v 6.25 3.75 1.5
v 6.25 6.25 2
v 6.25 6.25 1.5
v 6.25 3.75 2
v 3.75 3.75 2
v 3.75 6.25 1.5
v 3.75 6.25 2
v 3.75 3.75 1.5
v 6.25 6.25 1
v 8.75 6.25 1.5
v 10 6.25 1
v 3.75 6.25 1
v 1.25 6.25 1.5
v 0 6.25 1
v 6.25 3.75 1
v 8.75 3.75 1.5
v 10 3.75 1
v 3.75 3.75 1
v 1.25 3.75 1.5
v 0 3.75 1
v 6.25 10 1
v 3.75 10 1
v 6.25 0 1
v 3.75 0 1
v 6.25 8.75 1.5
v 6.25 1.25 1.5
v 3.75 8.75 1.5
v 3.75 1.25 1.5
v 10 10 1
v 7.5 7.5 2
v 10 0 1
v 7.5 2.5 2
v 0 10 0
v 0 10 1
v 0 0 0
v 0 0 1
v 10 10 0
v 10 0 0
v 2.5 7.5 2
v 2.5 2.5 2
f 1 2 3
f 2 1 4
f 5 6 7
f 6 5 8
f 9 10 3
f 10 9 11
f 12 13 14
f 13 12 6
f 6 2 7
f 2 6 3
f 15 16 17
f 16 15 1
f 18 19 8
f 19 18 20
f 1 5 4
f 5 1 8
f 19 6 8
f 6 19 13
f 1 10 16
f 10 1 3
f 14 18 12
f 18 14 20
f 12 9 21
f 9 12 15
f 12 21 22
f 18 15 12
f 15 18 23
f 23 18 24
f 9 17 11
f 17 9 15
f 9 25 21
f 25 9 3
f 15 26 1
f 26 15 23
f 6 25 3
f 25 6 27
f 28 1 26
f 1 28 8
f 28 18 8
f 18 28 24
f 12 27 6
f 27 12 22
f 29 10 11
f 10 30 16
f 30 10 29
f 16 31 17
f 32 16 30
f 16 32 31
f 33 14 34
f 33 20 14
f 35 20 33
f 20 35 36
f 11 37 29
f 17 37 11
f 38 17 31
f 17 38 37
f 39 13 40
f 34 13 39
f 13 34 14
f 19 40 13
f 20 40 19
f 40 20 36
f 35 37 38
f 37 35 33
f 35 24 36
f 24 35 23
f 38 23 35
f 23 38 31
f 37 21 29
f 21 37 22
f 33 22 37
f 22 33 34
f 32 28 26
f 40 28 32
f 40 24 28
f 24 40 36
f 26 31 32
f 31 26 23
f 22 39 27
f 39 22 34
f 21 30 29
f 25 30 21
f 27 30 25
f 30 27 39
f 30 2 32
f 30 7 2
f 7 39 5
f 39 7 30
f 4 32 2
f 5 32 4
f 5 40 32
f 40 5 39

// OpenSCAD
///< Zip tie pad

pad_w = 10;
pad_d = pad_w;
pad_h = 1;

zip_tie_pad();

module zip_tie_pad(){
     center = pad_w/2-pad_w/8;
     difference(){
	  tie_pad(pad_w, pad_h);
	  zip_anchor(pad_w, pad_h, center);
     }
}

module zip_anchor(w,h,c){    
     color( rand_clr() )
	  union(){
	  translate([c,c,h+h*0.1])color( rand_clr() )cube( [w/4, w/4, h] );
	  translate([0,c,h])cube([w, w/4, h/2]);
	  translate([c,0,h])cube([w/4, w, h/2]);
     }
}

module tie_pad(w,h){
    hull(){
        cube([w, w, h]);
	translate([w/4,w/4,h])color( rand_clr() ) cube([w/2, w/2, h ]);
    }
}

function rand_clr() = rands( 0,1,3 );
     
